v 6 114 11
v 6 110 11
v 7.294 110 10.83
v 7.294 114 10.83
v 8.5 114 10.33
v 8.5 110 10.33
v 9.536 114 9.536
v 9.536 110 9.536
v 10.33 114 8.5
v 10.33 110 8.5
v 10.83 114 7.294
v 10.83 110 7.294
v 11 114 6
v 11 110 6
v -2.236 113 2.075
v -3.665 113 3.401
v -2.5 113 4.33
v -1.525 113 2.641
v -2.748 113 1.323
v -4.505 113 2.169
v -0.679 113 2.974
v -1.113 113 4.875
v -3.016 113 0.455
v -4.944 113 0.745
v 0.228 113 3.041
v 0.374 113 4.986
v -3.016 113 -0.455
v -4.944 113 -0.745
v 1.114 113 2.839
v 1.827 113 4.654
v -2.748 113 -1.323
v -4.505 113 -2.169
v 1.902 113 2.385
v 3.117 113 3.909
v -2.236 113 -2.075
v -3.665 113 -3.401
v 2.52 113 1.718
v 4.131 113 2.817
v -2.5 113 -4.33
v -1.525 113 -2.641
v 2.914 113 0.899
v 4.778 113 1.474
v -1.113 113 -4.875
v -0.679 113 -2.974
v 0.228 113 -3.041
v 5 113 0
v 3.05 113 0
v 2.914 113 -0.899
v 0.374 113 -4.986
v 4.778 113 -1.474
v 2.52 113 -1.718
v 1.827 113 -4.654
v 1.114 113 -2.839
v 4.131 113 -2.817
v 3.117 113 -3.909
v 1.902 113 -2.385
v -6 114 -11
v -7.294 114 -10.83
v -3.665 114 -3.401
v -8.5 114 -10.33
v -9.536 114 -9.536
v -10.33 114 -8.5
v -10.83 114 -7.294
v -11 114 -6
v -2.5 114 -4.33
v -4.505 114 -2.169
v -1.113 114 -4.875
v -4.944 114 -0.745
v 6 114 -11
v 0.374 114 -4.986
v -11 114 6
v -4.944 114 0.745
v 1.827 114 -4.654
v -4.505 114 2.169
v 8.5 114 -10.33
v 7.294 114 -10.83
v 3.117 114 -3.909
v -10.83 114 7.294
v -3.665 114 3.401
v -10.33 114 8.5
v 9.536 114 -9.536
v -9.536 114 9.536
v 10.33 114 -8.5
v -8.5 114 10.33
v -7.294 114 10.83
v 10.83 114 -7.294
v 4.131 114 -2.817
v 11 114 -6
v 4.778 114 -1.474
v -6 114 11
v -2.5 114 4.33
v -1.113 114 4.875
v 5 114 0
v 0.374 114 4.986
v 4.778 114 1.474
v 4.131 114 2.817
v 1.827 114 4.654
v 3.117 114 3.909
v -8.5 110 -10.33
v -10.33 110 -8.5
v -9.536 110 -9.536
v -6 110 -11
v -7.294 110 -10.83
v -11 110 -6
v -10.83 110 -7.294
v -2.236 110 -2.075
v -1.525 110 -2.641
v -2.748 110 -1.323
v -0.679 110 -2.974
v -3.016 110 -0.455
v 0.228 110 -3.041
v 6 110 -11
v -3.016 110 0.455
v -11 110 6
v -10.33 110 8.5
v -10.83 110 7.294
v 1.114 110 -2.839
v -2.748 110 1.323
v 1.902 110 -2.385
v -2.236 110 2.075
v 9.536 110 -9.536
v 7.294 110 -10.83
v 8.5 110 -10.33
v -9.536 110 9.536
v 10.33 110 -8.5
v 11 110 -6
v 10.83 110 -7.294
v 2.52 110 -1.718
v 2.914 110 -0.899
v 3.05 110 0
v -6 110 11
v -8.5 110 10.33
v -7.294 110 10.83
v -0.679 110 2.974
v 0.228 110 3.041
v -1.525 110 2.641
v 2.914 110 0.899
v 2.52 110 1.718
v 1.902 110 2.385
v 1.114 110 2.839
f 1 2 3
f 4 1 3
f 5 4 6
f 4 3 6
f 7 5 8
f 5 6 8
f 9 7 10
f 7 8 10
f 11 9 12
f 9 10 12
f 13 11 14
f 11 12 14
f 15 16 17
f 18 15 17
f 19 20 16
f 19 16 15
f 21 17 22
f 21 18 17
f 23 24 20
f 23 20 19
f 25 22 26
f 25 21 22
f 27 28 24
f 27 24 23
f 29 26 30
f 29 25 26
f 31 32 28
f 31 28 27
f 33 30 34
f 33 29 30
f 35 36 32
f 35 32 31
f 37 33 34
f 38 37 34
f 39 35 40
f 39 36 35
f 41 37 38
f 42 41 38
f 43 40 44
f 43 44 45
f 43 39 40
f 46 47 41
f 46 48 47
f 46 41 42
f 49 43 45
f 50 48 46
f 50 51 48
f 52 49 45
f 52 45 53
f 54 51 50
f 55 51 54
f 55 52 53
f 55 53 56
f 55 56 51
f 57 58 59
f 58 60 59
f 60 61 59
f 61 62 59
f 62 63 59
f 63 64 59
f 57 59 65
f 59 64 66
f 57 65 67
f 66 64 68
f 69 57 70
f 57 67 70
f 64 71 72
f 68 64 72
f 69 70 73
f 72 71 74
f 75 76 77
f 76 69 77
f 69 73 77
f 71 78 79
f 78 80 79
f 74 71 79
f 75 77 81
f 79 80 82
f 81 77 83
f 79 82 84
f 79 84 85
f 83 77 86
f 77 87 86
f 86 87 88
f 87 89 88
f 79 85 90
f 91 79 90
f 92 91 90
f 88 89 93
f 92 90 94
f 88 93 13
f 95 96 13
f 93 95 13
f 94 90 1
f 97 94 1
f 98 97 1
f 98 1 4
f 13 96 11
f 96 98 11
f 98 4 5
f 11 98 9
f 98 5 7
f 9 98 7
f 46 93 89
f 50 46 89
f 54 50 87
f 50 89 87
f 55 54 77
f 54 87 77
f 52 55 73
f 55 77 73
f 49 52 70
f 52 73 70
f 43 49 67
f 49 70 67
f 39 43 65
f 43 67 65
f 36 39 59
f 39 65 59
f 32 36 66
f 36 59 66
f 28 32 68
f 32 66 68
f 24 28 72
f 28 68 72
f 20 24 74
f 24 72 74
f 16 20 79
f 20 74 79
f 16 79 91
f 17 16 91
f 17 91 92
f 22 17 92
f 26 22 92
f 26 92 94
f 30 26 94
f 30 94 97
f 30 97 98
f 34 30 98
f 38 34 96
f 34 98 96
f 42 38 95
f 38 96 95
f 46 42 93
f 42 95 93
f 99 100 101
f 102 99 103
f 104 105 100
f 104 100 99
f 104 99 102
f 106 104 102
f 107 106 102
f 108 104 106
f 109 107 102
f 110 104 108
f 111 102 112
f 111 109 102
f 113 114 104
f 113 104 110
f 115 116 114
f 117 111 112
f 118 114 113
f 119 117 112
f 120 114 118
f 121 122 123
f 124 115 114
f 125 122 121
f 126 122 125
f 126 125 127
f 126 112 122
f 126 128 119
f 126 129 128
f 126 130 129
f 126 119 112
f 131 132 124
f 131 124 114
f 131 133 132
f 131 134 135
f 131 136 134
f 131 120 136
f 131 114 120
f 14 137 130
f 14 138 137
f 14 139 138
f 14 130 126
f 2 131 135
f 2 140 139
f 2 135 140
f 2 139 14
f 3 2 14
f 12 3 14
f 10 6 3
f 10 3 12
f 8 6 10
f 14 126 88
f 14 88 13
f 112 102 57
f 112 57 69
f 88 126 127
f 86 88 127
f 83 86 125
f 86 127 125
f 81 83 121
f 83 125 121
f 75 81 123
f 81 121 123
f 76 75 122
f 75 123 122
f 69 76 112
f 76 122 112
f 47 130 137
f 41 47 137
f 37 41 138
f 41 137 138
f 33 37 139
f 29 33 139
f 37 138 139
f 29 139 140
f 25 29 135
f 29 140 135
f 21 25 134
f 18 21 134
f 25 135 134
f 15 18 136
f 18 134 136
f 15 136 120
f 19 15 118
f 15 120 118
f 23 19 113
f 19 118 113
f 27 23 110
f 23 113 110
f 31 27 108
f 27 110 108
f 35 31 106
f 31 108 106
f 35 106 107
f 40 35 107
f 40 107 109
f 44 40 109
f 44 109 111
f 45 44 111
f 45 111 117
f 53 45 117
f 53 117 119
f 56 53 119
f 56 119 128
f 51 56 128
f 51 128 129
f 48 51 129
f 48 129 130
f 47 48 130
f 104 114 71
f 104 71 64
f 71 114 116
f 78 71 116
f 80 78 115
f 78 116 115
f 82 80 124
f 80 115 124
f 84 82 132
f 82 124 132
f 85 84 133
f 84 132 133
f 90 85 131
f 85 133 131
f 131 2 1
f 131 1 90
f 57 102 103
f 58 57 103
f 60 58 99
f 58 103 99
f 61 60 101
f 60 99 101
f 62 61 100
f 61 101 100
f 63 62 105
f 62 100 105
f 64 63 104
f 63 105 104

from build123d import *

# Parameters (mm, degrees)
PAD008_DEPTH    = 4
SKETCH032_R     = 3.05
POCKET_DEPTH    = 3.2
SKETCH033_R     = 5
POCKET001_DEPTH = 1


with BuildPart() as part:
    # Sketch013 → Pad008 (new body)
    with BuildSketch(Plane(origin=(0, 0, 0), x_dir=(-1, 0, 0), z_dir=(0, 1, 0))):
        with BuildLine():
            Line((-6, 11), (6, 11))
            ThreePointArc((11, 6), (9.535534, 9.535534), (6, 11))
            Line((11, 6), (11, -6))
            ThreePointArc((6, -11), (9.535534, -9.535534), (11, -6))
            Line((6, -11), (-6, -11))
            ThreePointArc((-11, -6), (-9.535534, -9.535534), (-6, -11))
            Line((-11, -6), (-11, 6))
            ThreePointArc((-6, 11), (-9.535534, 9.535534), (-11, 6))
        make_face()
    extrude(amount=PAD008_DEPTH)

    # Sketch032 → Pocket (cut)
    with BuildSketch(Plane.XZ):
        Circle(SKETCH032_R)
    extrude(amount=-POCKET_DEPTH, mode=Mode.SUBTRACT)

    # Sketch033 (on Face5 of Pocket) → Pocket001 (cut)
    with BuildSketch(Plane(origin=(0, 4, 0), x_dir=(1, 0, 0), z_dir=(0, 1, 0))):
        Circle(SKETCH033_R)
    extrude(amount=-POCKET001_DEPTH, mode=Mode.SUBTRACT)


with BuildPart() as part_1:
    # Body013 placement: moved
    add(part.part.moved(Location((0, 110, 0))))


solid = part_1.part
